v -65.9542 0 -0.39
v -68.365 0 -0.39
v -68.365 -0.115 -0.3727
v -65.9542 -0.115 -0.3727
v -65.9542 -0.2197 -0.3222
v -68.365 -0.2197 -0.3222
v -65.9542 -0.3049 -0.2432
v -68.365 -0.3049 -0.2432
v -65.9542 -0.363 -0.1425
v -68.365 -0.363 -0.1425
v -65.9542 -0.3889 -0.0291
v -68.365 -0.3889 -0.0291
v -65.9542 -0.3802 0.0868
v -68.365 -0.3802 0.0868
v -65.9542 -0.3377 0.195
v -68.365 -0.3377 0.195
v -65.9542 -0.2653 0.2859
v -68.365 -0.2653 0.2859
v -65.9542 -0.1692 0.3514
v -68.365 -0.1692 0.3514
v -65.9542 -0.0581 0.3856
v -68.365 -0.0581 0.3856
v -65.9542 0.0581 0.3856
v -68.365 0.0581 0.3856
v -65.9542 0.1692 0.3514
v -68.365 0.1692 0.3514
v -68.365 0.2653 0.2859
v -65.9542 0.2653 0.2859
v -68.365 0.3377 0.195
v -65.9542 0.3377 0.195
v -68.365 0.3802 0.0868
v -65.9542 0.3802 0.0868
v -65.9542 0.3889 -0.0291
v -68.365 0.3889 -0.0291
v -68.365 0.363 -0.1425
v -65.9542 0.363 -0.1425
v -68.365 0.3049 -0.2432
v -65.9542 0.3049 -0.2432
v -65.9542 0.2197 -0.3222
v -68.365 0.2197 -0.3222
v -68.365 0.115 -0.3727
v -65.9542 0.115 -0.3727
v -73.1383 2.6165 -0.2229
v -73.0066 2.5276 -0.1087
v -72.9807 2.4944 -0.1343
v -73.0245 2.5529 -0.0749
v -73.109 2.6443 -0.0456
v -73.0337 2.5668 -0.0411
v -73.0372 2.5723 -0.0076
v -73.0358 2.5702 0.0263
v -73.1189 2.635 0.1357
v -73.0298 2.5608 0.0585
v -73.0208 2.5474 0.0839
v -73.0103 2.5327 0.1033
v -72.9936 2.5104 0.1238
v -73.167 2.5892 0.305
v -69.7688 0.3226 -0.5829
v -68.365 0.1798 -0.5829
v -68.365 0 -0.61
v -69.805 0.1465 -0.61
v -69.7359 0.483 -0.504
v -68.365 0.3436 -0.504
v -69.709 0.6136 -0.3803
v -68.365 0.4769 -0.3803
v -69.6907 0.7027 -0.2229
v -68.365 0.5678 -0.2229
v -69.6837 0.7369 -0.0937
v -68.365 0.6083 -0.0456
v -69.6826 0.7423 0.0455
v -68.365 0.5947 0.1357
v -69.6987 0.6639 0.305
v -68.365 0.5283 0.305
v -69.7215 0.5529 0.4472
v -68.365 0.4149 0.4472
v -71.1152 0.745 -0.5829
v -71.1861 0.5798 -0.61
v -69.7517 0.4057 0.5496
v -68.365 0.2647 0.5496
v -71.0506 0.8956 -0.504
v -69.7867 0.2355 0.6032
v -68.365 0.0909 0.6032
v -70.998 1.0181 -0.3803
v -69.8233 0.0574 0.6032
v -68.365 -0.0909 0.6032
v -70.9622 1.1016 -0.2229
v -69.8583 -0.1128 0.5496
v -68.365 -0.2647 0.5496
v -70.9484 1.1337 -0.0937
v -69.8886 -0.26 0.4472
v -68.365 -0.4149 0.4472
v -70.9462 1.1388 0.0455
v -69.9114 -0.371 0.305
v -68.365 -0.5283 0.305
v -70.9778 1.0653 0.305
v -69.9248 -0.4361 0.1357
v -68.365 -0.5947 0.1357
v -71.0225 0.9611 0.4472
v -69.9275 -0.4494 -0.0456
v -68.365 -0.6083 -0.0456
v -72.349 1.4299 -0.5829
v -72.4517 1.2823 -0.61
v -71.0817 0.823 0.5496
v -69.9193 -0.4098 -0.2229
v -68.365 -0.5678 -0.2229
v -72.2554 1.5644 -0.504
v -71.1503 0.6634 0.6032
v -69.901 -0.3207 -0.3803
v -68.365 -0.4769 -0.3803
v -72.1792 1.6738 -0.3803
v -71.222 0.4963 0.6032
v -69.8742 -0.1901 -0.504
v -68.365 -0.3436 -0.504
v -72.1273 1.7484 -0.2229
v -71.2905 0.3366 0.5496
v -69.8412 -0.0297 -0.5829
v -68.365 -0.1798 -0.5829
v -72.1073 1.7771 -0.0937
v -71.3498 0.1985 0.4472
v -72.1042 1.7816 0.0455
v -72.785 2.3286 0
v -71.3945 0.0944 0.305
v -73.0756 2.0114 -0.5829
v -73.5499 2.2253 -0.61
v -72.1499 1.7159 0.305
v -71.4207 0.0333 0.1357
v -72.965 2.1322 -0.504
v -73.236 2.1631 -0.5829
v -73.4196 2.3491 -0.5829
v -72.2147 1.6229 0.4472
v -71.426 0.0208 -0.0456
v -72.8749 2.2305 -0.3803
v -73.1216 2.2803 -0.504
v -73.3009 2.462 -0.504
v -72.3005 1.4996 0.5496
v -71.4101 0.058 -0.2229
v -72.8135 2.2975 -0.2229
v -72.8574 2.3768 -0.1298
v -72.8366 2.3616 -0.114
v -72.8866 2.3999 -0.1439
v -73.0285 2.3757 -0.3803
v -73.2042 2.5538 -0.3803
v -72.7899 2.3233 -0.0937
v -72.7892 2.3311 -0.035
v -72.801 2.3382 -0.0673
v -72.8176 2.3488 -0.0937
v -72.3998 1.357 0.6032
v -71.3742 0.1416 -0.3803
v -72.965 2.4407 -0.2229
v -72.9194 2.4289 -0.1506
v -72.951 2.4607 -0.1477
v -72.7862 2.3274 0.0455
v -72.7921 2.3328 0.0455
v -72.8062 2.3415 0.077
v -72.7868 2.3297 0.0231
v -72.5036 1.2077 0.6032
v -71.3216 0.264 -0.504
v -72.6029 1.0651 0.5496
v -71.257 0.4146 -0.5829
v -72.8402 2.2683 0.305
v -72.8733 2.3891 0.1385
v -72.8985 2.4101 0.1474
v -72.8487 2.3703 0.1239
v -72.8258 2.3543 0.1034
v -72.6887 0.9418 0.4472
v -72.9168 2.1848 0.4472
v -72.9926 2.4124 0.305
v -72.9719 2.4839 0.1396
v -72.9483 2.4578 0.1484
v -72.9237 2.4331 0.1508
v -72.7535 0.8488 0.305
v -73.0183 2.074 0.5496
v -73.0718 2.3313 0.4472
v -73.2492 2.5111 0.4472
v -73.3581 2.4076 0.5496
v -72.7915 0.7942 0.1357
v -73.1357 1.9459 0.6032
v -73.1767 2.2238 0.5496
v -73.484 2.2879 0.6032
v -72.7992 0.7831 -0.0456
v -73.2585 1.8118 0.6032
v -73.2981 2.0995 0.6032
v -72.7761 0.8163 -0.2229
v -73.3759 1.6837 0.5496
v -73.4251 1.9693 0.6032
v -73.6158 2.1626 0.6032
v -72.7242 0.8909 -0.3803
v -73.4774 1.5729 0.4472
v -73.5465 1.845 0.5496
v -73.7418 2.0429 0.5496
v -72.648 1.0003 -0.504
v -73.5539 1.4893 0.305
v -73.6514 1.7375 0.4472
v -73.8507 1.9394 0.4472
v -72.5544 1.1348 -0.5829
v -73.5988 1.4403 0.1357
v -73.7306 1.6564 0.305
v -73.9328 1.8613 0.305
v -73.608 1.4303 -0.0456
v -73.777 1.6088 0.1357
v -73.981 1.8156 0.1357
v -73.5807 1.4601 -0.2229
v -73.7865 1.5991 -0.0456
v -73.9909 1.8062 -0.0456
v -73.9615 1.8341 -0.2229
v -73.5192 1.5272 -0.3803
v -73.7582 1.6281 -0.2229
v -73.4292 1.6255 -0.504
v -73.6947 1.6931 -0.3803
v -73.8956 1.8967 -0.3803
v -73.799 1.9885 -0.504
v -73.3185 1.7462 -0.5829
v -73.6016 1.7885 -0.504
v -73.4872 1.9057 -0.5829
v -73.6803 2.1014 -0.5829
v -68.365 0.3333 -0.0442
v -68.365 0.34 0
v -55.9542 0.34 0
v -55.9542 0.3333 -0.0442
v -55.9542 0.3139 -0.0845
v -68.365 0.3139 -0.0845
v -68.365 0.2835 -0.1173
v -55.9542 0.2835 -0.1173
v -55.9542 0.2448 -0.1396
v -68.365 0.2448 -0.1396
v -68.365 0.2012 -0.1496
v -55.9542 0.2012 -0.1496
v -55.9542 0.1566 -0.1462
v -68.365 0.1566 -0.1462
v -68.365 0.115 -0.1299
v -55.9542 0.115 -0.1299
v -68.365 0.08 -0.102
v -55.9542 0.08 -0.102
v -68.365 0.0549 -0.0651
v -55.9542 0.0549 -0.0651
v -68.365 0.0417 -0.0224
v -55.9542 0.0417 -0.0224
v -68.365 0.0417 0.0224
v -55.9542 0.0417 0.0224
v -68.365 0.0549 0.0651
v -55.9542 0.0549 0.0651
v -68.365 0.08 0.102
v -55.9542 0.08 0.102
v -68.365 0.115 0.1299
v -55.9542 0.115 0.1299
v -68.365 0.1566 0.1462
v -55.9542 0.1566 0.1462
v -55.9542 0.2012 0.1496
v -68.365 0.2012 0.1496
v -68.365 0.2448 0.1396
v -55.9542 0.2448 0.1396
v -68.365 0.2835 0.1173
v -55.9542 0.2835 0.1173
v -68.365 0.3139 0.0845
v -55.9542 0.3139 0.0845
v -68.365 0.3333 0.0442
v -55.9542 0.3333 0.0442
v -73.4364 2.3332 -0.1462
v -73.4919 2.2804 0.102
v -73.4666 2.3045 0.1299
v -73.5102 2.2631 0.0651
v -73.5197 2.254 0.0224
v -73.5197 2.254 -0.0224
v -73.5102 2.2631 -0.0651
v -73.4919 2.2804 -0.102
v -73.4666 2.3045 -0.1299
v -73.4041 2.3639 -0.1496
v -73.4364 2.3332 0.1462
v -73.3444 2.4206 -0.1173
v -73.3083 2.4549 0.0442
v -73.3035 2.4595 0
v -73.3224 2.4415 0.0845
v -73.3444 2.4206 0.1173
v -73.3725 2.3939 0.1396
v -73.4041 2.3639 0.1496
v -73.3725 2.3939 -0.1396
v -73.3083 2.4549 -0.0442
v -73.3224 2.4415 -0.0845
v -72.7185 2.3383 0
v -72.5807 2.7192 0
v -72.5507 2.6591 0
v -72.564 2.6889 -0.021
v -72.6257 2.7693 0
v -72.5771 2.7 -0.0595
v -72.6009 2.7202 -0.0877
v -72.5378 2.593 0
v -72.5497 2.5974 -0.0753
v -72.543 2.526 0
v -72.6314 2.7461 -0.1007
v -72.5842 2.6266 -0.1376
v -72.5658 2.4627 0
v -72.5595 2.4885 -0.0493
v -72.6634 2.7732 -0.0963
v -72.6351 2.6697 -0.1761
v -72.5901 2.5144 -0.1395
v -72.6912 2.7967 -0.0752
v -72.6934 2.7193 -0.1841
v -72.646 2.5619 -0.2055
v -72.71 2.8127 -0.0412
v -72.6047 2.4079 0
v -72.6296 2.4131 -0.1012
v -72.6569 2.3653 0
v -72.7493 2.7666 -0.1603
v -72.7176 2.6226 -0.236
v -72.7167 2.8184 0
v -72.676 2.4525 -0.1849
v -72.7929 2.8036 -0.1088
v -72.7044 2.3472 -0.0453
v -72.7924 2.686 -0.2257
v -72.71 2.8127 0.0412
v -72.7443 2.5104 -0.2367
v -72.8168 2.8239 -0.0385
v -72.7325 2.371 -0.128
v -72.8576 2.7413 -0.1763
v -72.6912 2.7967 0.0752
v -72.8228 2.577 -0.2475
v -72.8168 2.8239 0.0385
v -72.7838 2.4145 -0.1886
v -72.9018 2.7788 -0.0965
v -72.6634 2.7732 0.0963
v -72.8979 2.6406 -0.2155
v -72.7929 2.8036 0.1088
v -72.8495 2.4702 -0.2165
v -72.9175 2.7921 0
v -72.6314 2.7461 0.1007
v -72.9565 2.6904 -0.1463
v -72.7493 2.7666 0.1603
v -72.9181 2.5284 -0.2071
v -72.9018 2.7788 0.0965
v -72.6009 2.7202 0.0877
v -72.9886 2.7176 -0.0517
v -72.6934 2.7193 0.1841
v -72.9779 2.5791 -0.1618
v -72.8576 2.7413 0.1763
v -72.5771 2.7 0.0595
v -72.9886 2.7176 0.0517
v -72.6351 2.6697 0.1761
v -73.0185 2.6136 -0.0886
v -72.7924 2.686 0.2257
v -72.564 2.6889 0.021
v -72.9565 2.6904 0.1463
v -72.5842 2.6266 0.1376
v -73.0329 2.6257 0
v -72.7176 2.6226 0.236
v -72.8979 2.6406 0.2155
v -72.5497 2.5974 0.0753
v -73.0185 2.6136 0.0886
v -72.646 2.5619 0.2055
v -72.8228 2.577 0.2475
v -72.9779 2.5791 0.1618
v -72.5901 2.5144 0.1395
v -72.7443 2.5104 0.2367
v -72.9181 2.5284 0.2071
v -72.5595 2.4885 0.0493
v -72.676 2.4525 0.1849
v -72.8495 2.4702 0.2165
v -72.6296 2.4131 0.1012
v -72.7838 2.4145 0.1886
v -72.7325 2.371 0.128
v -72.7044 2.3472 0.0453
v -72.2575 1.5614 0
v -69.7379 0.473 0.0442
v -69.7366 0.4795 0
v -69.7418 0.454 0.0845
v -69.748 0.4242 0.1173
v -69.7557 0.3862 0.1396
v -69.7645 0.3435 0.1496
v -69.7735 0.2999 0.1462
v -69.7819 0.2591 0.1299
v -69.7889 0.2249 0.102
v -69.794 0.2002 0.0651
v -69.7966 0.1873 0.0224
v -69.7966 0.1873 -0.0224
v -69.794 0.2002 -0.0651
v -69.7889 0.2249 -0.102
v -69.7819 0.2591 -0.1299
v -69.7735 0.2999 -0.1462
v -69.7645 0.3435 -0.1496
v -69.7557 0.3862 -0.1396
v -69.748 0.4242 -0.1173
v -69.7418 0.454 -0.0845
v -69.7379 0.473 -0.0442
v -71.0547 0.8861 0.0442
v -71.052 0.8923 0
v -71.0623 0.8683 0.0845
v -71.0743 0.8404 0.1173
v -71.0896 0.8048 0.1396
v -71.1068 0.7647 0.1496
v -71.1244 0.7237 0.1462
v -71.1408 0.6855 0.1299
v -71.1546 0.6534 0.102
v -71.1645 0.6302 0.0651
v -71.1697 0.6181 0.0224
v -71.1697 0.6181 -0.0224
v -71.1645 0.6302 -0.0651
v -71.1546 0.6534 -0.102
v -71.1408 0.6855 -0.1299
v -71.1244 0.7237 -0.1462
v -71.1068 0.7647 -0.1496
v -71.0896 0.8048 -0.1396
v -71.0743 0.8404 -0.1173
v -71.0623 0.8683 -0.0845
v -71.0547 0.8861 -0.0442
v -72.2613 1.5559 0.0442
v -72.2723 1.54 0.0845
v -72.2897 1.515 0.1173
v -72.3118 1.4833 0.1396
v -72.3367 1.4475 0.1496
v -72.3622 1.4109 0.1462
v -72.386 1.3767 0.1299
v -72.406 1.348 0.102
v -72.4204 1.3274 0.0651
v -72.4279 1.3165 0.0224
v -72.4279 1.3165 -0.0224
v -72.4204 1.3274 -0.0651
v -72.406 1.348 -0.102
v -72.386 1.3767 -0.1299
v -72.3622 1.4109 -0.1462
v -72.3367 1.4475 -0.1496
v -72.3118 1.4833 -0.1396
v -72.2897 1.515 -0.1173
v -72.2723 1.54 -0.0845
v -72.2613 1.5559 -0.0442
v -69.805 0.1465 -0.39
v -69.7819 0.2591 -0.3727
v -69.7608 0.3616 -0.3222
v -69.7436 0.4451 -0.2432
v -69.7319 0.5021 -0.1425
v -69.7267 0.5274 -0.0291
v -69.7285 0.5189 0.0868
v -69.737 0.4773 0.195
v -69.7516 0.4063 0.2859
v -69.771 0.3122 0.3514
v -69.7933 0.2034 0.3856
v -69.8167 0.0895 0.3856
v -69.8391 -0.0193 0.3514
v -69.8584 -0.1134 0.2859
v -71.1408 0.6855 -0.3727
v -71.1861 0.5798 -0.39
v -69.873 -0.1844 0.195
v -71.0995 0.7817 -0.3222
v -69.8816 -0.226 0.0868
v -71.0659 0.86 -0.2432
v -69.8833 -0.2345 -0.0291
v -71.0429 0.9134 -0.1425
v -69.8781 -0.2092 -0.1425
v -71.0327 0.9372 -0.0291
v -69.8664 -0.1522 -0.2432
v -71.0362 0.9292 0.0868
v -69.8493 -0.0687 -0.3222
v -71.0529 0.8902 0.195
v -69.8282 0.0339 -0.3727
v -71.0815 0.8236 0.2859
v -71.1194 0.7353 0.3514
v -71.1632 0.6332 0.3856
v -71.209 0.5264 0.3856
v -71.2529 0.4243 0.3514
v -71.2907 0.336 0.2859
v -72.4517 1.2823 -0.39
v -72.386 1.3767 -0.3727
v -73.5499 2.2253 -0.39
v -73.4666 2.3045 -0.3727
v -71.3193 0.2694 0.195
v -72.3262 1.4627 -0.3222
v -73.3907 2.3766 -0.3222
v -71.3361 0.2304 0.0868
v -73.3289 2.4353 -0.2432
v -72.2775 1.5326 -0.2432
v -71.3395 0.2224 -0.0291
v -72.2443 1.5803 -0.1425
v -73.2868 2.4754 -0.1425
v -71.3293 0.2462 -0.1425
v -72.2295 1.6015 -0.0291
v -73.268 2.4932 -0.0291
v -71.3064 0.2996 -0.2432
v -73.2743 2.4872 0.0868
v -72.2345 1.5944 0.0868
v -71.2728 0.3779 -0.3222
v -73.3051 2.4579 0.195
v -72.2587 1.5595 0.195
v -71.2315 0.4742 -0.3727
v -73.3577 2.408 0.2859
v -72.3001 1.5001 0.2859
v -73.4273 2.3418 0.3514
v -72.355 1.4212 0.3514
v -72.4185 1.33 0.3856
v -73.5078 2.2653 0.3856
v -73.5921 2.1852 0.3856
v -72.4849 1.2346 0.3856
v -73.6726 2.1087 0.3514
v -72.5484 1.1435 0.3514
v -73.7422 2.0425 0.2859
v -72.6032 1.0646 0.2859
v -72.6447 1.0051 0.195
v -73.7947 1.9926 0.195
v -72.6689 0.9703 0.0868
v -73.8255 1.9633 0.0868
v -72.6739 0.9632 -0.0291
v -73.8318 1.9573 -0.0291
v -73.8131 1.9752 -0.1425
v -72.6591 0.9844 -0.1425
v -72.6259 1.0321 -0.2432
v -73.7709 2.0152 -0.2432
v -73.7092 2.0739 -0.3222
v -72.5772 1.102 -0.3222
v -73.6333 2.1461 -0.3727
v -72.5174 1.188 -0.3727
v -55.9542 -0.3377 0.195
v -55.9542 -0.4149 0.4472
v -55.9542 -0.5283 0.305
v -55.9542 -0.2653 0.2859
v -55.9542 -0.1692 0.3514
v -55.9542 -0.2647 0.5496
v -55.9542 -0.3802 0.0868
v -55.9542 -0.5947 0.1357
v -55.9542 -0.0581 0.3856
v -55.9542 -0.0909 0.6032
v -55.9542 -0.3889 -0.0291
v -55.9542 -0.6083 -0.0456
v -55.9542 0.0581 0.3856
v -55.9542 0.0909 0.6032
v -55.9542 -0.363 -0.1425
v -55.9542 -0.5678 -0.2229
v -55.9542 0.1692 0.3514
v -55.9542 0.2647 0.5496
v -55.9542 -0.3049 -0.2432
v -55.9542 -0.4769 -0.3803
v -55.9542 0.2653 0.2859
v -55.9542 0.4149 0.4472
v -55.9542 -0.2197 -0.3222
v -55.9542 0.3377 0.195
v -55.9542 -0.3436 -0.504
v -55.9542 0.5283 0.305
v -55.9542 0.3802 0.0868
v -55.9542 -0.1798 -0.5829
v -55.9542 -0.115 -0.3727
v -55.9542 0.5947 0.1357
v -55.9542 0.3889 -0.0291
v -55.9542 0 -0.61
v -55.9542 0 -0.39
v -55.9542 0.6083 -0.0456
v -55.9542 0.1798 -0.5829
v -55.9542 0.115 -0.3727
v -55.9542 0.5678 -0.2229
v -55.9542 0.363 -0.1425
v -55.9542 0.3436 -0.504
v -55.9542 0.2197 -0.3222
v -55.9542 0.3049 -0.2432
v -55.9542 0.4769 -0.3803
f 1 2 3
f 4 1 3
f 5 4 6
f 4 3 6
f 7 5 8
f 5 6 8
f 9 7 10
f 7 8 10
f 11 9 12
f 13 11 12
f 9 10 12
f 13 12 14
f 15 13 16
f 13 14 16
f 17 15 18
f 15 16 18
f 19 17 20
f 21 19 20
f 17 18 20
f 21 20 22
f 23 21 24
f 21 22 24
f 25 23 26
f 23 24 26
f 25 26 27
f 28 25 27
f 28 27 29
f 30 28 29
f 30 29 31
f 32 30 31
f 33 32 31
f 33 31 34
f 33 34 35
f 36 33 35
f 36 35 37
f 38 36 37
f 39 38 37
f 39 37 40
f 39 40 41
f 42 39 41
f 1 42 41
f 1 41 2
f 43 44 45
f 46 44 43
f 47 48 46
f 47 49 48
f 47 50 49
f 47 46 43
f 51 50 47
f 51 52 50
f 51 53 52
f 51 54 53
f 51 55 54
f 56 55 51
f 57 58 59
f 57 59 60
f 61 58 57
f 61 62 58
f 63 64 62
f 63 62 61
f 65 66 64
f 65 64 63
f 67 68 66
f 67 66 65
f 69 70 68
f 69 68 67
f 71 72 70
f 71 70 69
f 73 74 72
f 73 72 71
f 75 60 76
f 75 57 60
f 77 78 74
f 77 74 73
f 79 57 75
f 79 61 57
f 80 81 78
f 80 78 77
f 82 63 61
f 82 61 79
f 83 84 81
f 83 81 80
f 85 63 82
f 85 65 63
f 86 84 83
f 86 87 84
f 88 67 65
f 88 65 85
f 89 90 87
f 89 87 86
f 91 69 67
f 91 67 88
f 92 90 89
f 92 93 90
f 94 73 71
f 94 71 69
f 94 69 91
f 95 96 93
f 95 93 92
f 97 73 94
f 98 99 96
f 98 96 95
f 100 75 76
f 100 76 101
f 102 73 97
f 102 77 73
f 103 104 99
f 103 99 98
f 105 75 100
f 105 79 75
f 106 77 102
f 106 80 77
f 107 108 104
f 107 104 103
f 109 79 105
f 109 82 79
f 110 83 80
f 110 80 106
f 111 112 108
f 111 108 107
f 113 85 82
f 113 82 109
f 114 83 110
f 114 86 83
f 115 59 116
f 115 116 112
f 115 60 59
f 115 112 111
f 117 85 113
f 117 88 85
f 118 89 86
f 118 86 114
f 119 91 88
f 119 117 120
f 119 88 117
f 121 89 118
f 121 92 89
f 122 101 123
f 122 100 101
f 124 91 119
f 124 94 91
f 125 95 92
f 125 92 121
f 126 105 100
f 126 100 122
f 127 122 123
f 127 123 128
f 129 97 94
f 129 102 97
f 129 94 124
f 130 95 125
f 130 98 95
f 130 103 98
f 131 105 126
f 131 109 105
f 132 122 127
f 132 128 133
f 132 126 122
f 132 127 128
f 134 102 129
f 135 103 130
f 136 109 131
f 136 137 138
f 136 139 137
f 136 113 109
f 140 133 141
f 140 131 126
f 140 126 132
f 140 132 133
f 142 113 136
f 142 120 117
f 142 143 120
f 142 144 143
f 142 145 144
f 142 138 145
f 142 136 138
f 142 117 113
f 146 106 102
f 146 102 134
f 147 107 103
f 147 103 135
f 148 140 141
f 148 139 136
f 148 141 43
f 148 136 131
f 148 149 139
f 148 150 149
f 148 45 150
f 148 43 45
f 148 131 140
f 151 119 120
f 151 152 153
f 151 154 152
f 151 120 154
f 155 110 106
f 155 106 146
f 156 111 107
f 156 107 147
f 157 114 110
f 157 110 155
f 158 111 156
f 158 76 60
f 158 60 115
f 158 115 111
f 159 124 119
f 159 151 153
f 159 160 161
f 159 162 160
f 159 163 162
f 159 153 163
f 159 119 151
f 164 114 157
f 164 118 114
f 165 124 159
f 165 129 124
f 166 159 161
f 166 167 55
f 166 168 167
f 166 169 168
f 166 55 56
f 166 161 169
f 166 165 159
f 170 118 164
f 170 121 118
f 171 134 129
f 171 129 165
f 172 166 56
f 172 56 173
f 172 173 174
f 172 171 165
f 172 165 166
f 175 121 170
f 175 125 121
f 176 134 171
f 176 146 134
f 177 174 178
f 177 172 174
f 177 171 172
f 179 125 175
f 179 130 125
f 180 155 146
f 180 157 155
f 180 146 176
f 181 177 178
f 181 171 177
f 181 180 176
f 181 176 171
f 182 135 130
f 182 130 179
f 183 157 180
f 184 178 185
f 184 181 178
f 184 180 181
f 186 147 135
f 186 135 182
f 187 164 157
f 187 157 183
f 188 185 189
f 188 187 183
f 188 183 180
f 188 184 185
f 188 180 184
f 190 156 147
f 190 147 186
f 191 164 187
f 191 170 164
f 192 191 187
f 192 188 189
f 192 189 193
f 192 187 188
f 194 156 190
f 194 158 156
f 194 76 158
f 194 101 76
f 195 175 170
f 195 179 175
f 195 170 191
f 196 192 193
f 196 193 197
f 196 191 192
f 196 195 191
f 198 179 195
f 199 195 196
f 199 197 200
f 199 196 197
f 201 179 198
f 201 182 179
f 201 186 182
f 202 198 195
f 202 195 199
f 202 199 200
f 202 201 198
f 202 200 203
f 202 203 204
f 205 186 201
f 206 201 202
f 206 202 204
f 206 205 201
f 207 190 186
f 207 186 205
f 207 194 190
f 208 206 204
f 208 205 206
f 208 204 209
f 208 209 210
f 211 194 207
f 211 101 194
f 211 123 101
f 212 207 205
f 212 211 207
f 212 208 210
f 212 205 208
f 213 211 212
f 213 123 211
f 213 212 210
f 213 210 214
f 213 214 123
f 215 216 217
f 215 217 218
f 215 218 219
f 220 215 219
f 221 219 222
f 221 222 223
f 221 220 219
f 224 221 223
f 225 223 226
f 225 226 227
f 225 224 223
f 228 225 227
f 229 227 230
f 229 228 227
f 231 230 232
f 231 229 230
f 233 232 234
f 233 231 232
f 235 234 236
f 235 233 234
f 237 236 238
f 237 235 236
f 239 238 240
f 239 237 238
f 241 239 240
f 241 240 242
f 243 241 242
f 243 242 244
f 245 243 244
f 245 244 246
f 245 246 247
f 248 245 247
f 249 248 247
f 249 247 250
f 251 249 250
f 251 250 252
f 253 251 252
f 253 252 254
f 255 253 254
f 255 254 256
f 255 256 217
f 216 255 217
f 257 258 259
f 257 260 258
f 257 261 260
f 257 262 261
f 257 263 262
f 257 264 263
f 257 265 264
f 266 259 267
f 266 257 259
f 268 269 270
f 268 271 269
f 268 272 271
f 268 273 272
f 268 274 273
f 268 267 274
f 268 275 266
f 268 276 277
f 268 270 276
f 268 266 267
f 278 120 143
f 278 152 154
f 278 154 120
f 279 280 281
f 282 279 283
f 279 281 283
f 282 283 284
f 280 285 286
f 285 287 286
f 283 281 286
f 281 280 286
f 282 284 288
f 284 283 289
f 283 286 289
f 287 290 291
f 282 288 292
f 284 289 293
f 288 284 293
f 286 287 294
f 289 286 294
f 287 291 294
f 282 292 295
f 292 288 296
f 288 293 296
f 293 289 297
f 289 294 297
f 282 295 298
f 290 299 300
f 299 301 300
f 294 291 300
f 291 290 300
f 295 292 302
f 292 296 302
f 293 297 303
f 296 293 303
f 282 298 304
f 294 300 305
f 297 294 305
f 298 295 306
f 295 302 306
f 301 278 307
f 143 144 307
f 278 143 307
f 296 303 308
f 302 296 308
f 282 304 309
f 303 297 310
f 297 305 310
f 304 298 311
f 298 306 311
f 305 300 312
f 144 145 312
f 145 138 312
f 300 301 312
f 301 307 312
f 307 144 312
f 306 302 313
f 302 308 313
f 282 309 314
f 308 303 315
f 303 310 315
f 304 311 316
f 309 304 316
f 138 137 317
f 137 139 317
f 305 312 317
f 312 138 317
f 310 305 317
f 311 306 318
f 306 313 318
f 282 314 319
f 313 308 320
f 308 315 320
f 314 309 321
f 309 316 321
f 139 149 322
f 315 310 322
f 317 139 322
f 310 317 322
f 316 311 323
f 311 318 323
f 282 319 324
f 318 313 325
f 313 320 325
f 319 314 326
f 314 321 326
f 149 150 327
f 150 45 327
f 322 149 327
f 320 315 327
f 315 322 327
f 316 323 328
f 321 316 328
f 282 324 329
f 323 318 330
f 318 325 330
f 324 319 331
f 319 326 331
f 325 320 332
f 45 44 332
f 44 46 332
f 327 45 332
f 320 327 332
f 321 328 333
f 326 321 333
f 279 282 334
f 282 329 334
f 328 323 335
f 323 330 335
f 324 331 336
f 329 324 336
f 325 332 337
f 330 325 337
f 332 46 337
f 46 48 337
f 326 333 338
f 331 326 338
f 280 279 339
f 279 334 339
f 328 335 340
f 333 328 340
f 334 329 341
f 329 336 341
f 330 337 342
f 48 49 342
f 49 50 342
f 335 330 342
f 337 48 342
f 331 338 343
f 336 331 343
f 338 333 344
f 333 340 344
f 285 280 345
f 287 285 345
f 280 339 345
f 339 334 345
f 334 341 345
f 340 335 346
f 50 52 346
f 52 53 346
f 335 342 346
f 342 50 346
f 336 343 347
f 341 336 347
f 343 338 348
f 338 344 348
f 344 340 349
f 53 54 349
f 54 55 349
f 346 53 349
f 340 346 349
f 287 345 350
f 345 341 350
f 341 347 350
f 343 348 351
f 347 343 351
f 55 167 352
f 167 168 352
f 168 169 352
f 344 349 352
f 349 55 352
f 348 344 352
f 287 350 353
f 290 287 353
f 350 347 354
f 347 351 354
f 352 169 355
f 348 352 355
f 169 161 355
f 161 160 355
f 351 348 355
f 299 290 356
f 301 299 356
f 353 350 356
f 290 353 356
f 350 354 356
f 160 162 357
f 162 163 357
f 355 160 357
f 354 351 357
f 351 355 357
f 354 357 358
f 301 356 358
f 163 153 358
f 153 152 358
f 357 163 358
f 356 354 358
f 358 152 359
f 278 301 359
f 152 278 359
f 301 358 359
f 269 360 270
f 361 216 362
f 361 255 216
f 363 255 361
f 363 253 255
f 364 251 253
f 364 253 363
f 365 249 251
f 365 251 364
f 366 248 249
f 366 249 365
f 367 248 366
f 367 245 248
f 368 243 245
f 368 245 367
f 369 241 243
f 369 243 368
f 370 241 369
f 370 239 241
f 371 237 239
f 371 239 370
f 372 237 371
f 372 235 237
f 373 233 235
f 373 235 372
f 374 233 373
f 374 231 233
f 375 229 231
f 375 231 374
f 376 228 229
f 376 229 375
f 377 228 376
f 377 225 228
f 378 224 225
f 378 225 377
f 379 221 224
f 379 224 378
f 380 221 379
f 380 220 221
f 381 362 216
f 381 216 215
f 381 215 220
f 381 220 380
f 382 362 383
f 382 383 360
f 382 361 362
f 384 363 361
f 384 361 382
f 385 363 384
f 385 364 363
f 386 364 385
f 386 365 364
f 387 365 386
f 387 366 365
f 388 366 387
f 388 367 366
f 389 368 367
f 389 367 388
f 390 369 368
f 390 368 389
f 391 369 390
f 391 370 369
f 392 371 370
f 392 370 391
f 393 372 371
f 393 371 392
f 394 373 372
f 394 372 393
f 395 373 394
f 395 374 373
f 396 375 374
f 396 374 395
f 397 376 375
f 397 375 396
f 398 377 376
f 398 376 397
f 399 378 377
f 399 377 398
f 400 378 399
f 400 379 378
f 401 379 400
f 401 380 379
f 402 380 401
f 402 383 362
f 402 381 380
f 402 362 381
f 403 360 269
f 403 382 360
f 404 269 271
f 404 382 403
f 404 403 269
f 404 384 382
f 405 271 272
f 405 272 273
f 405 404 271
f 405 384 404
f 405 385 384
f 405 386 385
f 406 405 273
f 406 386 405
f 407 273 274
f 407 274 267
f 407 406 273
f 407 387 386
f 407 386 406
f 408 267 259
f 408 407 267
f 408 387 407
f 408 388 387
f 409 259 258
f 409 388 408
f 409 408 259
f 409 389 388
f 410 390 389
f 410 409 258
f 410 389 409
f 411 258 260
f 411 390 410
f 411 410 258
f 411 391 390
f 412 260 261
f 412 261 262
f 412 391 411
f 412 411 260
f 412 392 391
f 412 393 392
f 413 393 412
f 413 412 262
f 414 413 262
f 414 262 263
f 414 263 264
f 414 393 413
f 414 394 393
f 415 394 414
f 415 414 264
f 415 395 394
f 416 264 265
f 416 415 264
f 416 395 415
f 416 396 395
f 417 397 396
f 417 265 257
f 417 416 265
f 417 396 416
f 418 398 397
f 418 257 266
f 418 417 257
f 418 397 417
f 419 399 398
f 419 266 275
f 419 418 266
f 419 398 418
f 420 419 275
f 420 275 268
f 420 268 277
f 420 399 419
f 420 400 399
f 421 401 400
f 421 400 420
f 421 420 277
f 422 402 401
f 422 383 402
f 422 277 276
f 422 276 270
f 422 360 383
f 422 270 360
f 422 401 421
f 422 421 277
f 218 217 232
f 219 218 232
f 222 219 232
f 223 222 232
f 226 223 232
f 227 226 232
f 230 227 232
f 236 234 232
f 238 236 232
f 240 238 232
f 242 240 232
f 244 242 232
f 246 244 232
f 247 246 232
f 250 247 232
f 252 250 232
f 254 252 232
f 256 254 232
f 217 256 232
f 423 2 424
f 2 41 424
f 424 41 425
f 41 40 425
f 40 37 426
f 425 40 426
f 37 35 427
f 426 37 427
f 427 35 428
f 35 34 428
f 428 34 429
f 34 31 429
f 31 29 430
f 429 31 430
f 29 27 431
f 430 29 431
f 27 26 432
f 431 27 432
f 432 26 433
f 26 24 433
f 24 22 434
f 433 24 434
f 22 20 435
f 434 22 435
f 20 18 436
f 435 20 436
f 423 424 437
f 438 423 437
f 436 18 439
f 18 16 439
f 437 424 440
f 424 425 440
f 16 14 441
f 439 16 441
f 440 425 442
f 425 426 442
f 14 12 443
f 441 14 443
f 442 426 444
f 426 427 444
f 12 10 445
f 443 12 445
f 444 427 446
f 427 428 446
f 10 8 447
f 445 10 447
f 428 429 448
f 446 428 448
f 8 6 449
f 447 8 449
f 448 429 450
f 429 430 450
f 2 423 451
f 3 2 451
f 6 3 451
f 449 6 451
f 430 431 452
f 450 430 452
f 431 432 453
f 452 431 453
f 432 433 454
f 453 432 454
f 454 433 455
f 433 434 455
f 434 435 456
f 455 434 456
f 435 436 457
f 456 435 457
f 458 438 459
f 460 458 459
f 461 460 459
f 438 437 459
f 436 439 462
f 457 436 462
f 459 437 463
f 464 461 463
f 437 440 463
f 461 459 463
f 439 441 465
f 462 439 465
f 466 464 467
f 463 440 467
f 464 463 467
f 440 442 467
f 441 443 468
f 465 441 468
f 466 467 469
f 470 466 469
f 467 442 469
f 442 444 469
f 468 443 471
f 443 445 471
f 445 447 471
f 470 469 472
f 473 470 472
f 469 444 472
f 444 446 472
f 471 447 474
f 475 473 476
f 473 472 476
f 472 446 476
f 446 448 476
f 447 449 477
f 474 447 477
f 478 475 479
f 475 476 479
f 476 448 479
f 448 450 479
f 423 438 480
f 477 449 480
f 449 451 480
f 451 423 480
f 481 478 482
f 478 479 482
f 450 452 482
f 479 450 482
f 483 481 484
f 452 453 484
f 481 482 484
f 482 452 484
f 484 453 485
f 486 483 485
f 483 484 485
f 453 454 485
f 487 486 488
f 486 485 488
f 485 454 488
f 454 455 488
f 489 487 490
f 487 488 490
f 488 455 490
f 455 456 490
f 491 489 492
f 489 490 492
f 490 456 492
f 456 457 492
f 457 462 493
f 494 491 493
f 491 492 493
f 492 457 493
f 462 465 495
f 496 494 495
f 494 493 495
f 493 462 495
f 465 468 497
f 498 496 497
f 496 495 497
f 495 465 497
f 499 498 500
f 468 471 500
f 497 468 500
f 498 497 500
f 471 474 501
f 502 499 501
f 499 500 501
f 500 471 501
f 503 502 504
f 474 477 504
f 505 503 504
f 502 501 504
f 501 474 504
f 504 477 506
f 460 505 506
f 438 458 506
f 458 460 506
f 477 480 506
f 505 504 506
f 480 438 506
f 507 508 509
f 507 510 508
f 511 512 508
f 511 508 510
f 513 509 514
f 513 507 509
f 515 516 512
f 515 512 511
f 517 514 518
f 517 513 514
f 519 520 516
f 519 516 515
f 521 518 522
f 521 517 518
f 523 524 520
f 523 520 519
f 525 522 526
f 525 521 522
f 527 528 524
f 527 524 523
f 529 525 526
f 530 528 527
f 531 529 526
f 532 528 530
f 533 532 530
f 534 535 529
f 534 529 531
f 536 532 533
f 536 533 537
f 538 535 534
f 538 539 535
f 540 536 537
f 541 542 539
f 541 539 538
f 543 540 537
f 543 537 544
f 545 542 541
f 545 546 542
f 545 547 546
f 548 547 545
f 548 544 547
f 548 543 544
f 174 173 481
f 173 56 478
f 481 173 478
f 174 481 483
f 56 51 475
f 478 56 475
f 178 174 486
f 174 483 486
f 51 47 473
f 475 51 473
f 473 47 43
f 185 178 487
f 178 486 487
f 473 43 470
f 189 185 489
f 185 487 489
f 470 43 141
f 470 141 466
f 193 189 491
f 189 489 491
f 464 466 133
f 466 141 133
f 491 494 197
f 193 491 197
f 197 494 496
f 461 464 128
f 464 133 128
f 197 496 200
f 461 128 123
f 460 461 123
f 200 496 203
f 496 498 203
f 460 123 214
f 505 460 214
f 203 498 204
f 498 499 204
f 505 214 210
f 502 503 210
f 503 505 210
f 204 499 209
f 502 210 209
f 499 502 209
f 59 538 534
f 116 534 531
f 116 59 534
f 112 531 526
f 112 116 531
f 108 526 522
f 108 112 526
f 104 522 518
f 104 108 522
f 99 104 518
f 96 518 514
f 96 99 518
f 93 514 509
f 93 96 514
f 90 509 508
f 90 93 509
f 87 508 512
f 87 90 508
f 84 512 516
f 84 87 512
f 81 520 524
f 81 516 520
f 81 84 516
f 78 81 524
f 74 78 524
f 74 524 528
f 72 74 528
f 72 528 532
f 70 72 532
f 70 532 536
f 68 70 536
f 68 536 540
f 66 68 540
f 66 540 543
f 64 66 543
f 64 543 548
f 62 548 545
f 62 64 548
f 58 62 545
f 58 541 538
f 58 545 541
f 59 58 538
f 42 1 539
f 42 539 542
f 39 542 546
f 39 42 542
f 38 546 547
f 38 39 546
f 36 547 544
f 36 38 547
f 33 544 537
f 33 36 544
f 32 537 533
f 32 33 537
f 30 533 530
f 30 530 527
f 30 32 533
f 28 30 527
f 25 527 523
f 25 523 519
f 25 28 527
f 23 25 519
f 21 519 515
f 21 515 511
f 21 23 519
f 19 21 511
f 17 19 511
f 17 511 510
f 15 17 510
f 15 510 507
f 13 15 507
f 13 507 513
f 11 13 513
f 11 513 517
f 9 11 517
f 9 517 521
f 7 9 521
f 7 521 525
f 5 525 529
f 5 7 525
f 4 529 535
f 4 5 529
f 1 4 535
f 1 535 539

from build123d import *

# Parameters (mm, degrees)
SKETCH5_R           = 0.61
SKETCH5_R_2         = 0.39
SKETCH5_2_R         = 0.61
SKETCH5_2_R_2       = 0.39
BOSS_EXTRUDE2_DEPTH = 10
SKETCH8_R           = 0.15


with BuildPart() as part:
    # Sweep2: sweep along a path in Sketch4
    with BuildLine(Plane.XY) as sweep2_path:
        Line((-65.954222951, 0), (-68.364968213, 0))
        ThreePointArc((-68.364968213, 0), (-71.186123393, 0.579815367), (-73.549932813, 2.225265895))
    # Sketch5 → Sweep2 (sweep)
    with BuildSketch(Plane(origin=(-65.954222951, 0, 0), x_dir=(0, 0, -1), z_dir=(1, 0, 0))):
        Circle(SKETCH5_R)
        Circle(SKETCH5_R_2, mode=Mode.SUBTRACT)
    sweep(path=sweep2_path.line)

    # Sketch5<2> → Boss-Extrude2 (add)
    with BuildSketch(Plane(origin=(-65.954222951, 0, 0), x_dir=(0, 0, -1), z_dir=(1, 0, 0))):
        Circle(SKETCH5_2_R)
        Circle(SKETCH5_2_R_2, mode=Mode.SUBTRACT)
    extrude(amount=BOSS_EXTRUDE2_DEPTH)

    # Sketch6 → Revolve2 (revolve)
    with BuildSketch(Plane.XY):
        with BuildLine():
            Line((-72.949063517, 2.38792888), (-72.625665662, 2.76926053))
            ThreePointArc((-72.625665662, 2.76926053), (-72.596698765, 2.416895777), (-72.949063517, 2.38792888))
        make_face()
    revolve(axis=Axis((-72.949063517, 2.38792888, 0), (0.6467957105420484, 0.7626632997754689, 0)))


with BuildPart() as body_2:
    # Sweep3: sweep along a path in Sketch7
    with BuildLine(Plane.XY) as sweep3_path:
        Line((-55.954222951, 0.19), (-68.364968213, 0.19))
        ThreePointArc((-68.364968213, 0.19), (-71.111189458, 0.754414638), (-73.412212703, 2.356159635))
    # Sketch8 → Sweep3 (sweep)
    with BuildSketch(Plane(origin=(-36.018221468, 37.89664365, 0), x_dir=(0.7248426853938525, 0.688914422429251, 0), z_dir=(-0.688914422429251, 0.7248426853938525, 0))):
        with Locations((-51.589113042, 0)):
            Circle(SKETCH8_R)
    sweep(path=sweep3_path.line)


solid = Compound([part.part, body_2.part])
